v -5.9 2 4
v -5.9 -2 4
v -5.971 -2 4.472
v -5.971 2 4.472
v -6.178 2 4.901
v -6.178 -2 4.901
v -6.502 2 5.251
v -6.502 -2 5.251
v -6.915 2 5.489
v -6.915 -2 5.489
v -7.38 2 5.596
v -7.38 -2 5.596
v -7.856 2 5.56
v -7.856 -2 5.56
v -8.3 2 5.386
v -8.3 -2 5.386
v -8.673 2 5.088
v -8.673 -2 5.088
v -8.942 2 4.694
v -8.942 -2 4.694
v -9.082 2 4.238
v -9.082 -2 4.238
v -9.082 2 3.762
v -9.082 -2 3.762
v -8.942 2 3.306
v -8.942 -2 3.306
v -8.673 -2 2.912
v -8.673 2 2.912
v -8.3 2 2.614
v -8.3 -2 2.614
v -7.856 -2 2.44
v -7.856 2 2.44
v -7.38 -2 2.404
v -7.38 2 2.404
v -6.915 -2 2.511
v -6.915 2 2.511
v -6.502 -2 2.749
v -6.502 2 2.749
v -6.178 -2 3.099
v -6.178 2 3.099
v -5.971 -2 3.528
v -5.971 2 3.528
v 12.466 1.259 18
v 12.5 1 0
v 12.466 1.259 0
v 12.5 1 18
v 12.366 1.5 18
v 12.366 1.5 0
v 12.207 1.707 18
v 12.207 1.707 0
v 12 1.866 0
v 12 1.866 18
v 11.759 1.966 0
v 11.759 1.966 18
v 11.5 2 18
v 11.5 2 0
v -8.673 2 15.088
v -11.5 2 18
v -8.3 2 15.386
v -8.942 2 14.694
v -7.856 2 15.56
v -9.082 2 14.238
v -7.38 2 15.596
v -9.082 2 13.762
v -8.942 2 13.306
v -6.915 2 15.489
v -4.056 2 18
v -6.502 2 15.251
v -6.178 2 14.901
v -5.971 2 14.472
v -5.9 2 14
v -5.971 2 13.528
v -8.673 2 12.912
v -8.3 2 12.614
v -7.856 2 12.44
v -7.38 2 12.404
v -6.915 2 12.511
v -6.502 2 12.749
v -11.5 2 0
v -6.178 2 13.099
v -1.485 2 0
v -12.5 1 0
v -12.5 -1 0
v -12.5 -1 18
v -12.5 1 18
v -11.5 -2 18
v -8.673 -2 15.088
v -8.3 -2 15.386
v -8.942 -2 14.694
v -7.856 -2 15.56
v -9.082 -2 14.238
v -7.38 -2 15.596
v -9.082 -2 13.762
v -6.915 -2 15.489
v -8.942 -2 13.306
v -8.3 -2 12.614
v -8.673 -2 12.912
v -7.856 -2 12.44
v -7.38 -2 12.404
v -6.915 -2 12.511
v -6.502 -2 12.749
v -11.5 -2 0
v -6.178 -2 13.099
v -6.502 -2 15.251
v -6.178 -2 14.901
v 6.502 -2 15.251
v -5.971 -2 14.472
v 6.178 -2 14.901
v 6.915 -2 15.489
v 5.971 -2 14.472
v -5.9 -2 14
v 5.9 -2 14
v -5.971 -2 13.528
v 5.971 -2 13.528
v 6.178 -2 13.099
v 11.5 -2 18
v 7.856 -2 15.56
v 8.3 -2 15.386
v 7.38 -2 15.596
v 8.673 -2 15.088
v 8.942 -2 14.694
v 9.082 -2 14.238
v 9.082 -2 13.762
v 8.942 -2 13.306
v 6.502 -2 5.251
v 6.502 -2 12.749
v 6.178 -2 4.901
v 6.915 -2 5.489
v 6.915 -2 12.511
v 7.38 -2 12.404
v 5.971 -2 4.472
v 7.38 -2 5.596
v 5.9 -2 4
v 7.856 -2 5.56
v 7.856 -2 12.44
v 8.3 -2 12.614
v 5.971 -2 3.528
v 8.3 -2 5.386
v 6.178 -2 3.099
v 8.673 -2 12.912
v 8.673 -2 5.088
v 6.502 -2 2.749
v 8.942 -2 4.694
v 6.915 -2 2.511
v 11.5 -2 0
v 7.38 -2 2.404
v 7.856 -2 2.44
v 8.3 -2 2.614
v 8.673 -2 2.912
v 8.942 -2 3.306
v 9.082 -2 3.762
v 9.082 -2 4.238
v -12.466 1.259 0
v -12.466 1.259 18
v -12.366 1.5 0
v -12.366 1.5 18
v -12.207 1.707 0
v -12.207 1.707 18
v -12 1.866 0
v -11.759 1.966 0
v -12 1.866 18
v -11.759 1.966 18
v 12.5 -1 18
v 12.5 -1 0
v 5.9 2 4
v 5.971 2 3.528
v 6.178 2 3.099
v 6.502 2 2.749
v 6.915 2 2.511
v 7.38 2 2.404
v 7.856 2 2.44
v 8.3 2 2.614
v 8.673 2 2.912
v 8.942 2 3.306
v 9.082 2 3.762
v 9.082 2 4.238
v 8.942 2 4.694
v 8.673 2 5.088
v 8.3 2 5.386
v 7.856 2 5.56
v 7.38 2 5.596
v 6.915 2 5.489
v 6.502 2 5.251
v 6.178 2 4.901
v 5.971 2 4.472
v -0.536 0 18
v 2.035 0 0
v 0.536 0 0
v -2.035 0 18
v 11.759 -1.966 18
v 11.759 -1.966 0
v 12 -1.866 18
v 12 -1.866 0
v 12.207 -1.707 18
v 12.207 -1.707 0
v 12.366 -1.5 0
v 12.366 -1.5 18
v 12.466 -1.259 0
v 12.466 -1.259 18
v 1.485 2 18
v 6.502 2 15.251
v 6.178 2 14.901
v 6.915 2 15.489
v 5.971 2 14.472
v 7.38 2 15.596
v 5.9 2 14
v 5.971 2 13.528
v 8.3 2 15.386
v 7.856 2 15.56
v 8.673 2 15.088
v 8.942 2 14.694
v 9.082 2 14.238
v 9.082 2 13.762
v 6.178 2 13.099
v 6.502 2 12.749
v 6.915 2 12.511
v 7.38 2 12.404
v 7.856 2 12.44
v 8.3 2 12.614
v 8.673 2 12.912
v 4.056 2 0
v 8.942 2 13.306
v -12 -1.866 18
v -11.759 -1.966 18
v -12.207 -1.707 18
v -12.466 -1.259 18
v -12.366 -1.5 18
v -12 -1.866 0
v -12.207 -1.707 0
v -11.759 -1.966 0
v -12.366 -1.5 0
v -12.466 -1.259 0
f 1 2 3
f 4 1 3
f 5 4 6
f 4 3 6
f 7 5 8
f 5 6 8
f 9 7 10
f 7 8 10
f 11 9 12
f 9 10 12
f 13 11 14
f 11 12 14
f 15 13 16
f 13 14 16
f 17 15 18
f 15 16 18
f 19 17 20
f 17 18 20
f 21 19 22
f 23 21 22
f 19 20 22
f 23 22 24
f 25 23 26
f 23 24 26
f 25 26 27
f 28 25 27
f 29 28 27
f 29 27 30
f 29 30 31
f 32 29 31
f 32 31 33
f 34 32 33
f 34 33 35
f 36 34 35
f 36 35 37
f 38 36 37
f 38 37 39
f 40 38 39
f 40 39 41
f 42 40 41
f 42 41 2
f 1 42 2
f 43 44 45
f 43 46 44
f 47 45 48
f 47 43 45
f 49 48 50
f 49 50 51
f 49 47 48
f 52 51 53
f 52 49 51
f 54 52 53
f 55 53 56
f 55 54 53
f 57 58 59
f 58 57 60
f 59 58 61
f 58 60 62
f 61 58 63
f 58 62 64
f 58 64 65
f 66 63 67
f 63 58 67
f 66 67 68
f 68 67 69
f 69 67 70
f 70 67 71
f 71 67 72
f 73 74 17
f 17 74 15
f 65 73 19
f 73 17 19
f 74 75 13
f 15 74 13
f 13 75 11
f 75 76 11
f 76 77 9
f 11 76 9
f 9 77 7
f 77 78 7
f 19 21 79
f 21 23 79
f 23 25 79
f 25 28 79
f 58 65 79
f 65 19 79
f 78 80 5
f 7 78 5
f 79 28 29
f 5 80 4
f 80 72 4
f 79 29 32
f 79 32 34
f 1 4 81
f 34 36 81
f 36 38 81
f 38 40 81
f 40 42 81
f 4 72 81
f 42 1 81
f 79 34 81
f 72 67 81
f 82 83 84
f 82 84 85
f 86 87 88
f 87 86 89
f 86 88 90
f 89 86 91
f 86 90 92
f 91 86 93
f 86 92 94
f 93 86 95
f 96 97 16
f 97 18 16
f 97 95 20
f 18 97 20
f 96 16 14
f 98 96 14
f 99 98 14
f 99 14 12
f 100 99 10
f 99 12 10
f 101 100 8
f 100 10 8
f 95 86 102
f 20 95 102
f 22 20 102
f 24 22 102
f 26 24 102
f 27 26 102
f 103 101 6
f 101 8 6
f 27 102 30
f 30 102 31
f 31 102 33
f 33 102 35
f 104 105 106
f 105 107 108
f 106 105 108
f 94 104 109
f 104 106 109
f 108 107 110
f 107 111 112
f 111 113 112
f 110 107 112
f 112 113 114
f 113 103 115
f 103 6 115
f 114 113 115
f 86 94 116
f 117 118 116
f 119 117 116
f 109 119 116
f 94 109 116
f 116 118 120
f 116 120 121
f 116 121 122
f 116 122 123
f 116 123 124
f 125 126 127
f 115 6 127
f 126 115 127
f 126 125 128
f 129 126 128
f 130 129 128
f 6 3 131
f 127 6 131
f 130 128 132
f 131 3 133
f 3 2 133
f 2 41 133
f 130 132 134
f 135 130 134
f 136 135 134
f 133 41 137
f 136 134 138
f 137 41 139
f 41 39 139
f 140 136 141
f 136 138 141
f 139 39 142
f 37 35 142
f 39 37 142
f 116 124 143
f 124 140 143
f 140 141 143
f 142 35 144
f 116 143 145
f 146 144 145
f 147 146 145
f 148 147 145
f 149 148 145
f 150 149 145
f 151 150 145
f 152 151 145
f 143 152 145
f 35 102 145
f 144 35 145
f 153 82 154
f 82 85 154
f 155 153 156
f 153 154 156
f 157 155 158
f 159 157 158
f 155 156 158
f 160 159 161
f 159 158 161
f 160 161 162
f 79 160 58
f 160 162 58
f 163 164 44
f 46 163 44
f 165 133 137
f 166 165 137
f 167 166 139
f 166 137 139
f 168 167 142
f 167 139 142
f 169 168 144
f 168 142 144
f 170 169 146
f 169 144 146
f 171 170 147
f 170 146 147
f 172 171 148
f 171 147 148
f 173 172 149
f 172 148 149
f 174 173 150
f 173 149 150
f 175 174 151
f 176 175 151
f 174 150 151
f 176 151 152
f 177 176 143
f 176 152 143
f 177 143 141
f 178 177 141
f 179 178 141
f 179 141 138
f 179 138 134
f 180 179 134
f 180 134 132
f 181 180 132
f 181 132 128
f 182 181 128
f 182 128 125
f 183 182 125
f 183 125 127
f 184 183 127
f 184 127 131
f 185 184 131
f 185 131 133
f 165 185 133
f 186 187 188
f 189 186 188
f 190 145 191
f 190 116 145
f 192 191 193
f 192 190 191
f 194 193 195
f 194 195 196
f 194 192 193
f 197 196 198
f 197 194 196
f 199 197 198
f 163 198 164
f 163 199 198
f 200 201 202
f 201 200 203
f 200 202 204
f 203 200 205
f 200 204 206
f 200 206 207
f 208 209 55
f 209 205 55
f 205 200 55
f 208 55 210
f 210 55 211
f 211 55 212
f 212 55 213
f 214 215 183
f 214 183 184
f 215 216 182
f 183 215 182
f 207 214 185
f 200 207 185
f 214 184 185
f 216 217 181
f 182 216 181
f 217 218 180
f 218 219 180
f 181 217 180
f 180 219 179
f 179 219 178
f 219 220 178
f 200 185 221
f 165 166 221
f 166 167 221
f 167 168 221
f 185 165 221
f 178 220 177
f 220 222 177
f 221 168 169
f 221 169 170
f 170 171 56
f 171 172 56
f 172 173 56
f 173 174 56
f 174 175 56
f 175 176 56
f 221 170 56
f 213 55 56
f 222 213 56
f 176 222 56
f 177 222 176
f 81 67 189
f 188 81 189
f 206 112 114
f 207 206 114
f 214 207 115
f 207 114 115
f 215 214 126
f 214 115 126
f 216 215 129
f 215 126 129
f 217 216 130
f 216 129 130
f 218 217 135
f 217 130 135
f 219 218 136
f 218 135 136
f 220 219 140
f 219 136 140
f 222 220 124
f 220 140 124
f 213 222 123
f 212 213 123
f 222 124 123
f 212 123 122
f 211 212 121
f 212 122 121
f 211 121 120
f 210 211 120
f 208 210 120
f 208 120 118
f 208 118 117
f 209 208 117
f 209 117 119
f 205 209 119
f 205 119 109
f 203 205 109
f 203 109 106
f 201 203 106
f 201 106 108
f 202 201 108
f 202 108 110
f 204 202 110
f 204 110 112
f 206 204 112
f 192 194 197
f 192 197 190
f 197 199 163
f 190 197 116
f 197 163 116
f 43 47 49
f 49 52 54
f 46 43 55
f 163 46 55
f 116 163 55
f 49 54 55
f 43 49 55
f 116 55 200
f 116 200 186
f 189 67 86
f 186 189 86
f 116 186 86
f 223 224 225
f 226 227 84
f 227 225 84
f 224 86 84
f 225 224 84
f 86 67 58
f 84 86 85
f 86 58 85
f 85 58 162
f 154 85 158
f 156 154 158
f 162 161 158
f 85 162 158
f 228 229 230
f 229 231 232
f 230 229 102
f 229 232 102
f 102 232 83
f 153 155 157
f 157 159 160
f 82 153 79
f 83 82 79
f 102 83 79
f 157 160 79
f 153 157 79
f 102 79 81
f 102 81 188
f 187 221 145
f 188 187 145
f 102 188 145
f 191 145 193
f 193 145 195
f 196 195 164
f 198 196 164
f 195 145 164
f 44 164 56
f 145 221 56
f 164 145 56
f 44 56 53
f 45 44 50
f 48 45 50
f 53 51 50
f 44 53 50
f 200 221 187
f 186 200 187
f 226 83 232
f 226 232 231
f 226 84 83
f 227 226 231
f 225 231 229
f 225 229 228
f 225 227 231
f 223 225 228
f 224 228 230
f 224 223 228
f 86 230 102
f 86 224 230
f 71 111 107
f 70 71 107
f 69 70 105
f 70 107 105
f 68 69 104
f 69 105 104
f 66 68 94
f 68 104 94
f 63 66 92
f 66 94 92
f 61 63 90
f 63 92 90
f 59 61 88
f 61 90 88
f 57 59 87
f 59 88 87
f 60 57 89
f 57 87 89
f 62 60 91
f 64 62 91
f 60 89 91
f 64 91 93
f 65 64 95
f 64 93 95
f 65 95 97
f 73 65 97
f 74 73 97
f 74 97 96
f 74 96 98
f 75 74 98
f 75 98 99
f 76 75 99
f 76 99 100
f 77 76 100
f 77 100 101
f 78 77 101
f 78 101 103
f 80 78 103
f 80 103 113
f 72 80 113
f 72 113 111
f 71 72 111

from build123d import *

# Parameters (mm, degrees)
SKETCH_1_W          = 25
SKETCH_1_H          = 4
EXTRUDE_1_DEPTH     = 18
FILLET_1_R          = 1
SKETCH_3_R          = 1.6
CUT_EXTRUDE_2_DEPTH = 23.27666941
CUT_EXTRUDE_3_DEPTH = 2
CHAMFER_2_SIZE      = 3.5
CHAMFER_3_SIZE      = 3.5


with BuildPart() as part:
    # 草图1 → 凸台-拉伸1 (new body)
    with BuildSketch(Plane.XY):
        Rectangle(SKETCH_1_W, SKETCH_1_H)
    extrude(amount=EXTRUDE_1_DEPTH)

    # 圆角1
    fillet_1_edges = [part.edges().sort_by_distance(p)[0] for p in [
        (-12.5, 2, 9),
        (12.5, 2, 9),
        (12.5, -2, 9),
        (-12.5, -2, 9),
    ]]
    fillet(fillet_1_edges, radius=FILLET_1_R)

    # 草图3 → 切除-拉伸2 (cut, through all)
    with BuildSketch(Plane.XZ.offset(2)):
        with Locations((-7.5, 14)):
            Circle(SKETCH_3_R)
        with Locations((-7.5, 4)):
            Circle(SKETCH_3_R)
        with Locations(Location((7.5, 4, 0), (0, 0, 180))):
            Circle(SKETCH_3_R)
        with Locations(Location((7.5, 14, 0), (0, 0, 180))):
            Circle(SKETCH_3_R)
    extrude(amount=-CUT_EXTRUDE_2_DEPTH, mode=Mode.SUBTRACT)

    # 草图4 → 切除-拉伸3 (cut)
    with BuildSketch(Plane(origin=(0, 2, 0), x_dir=(1, 0, 0), z_dir=(0, 1, 0))):
        Polygon((5.570878435, 0), (3, -18), (-5.570878435, -18), (-3, 0), align=None)
    extrude(amount=-CUT_EXTRUDE_3_DEPTH, mode=Mode.SUBTRACT)

    # 倒角2
    # the kernel refuses this chamfer: 3.5 mm, written as the material it adds along each edge
    with BuildSketch(Plane(origin=(6.843529685, 0, -8.910465074), x_dir=(0.027219645584784704, 0.9996219169112968, 0.00388768887943796), z_dir=(-0.14139170518175465, 0, 0.9899537290731298))) as chamfer_2_piece_1_section:
        Polygon((CHAMFER_2_SIZE * 0.999621916911, CHAMFER_2_SIZE * 0.0274958766106), (-CHAMFER_2_SIZE * 0.0274958766106, CHAMFER_2_SIZE * 0.999621916911), (0, 0), align=None)
    chamfer_2_piece_1 = extrude(amount=36.184448925, mode=Mode.PRIVATE)
    chamfer_2_piece_1 = split(chamfer_2_piece_1, bisect_by=Plane(origin=(2.941803391, 0.818076093, 0), z_dir=(0, 0, 1)), keep=Keep.TOP, mode=Mode.PRIVATE)
    chamfer_2_piece_1 = split(chamfer_2_piece_1, bisect_by=Plane(origin=(2.941803391, 0.818076093, 18), z_dir=(0, 0, -1)), keep=Keep.TOP, mode=Mode.PRIVATE)
    chamfer_2_piece_1 = split(chamfer_2_piece_1, bisect_by=Plane(origin=(2.941803391, 2, 9), z_dir=(0, -1, 0)), keep=Keep.TOP, mode=Mode.PRIVATE)
    add(chamfer_2_piece_1)

    # 倒角3
    # the kernel refuses this chamfer: 3.5 mm, written as the material it adds along each edge
    with BuildSketch(Plane(origin=(-6.843529685, 0, 26.910465074), x_dir=(-0.02721964558478464, 0.9996219169112968, -0.003887688879437917), z_dir=(0.14139170518175467, 0, -0.9899537290731298))) as chamfer_3_piece_1_section:
        Polygon((CHAMFER_3_SIZE * 0.999621916911, CHAMFER_3_SIZE * 0.0274958766106), (-CHAMFER_3_SIZE * 0.0274958766106, CHAMFER_3_SIZE * 0.999621916911), (0, 0), align=None)
    chamfer_3_piece_1 = extrude(amount=36.184448925, mode=Mode.PRIVATE)
    chamfer_3_piece_1 = split(chamfer_3_piece_1, bisect_by=Plane(origin=(-2.941803391, 2, 9), z_dir=(0, -1, 0)), keep=Keep.TOP, mode=Mode.PRIVATE)
    chamfer_3_piece_1 = split(chamfer_3_piece_1, bisect_by=Plane(origin=(-2.941803391, 0.818076093, 18), z_dir=(0, 0, -1)), keep=Keep.TOP, mode=Mode.PRIVATE)
    chamfer_3_piece_1 = split(chamfer_3_piece_1, bisect_by=Plane(origin=(-2.941803391, 0.818076093, 0), z_dir=(0, 0, 1)), keep=Keep.TOP, mode=Mode.PRIVATE)
    add(chamfer_3_piece_1)


solid = part.part
